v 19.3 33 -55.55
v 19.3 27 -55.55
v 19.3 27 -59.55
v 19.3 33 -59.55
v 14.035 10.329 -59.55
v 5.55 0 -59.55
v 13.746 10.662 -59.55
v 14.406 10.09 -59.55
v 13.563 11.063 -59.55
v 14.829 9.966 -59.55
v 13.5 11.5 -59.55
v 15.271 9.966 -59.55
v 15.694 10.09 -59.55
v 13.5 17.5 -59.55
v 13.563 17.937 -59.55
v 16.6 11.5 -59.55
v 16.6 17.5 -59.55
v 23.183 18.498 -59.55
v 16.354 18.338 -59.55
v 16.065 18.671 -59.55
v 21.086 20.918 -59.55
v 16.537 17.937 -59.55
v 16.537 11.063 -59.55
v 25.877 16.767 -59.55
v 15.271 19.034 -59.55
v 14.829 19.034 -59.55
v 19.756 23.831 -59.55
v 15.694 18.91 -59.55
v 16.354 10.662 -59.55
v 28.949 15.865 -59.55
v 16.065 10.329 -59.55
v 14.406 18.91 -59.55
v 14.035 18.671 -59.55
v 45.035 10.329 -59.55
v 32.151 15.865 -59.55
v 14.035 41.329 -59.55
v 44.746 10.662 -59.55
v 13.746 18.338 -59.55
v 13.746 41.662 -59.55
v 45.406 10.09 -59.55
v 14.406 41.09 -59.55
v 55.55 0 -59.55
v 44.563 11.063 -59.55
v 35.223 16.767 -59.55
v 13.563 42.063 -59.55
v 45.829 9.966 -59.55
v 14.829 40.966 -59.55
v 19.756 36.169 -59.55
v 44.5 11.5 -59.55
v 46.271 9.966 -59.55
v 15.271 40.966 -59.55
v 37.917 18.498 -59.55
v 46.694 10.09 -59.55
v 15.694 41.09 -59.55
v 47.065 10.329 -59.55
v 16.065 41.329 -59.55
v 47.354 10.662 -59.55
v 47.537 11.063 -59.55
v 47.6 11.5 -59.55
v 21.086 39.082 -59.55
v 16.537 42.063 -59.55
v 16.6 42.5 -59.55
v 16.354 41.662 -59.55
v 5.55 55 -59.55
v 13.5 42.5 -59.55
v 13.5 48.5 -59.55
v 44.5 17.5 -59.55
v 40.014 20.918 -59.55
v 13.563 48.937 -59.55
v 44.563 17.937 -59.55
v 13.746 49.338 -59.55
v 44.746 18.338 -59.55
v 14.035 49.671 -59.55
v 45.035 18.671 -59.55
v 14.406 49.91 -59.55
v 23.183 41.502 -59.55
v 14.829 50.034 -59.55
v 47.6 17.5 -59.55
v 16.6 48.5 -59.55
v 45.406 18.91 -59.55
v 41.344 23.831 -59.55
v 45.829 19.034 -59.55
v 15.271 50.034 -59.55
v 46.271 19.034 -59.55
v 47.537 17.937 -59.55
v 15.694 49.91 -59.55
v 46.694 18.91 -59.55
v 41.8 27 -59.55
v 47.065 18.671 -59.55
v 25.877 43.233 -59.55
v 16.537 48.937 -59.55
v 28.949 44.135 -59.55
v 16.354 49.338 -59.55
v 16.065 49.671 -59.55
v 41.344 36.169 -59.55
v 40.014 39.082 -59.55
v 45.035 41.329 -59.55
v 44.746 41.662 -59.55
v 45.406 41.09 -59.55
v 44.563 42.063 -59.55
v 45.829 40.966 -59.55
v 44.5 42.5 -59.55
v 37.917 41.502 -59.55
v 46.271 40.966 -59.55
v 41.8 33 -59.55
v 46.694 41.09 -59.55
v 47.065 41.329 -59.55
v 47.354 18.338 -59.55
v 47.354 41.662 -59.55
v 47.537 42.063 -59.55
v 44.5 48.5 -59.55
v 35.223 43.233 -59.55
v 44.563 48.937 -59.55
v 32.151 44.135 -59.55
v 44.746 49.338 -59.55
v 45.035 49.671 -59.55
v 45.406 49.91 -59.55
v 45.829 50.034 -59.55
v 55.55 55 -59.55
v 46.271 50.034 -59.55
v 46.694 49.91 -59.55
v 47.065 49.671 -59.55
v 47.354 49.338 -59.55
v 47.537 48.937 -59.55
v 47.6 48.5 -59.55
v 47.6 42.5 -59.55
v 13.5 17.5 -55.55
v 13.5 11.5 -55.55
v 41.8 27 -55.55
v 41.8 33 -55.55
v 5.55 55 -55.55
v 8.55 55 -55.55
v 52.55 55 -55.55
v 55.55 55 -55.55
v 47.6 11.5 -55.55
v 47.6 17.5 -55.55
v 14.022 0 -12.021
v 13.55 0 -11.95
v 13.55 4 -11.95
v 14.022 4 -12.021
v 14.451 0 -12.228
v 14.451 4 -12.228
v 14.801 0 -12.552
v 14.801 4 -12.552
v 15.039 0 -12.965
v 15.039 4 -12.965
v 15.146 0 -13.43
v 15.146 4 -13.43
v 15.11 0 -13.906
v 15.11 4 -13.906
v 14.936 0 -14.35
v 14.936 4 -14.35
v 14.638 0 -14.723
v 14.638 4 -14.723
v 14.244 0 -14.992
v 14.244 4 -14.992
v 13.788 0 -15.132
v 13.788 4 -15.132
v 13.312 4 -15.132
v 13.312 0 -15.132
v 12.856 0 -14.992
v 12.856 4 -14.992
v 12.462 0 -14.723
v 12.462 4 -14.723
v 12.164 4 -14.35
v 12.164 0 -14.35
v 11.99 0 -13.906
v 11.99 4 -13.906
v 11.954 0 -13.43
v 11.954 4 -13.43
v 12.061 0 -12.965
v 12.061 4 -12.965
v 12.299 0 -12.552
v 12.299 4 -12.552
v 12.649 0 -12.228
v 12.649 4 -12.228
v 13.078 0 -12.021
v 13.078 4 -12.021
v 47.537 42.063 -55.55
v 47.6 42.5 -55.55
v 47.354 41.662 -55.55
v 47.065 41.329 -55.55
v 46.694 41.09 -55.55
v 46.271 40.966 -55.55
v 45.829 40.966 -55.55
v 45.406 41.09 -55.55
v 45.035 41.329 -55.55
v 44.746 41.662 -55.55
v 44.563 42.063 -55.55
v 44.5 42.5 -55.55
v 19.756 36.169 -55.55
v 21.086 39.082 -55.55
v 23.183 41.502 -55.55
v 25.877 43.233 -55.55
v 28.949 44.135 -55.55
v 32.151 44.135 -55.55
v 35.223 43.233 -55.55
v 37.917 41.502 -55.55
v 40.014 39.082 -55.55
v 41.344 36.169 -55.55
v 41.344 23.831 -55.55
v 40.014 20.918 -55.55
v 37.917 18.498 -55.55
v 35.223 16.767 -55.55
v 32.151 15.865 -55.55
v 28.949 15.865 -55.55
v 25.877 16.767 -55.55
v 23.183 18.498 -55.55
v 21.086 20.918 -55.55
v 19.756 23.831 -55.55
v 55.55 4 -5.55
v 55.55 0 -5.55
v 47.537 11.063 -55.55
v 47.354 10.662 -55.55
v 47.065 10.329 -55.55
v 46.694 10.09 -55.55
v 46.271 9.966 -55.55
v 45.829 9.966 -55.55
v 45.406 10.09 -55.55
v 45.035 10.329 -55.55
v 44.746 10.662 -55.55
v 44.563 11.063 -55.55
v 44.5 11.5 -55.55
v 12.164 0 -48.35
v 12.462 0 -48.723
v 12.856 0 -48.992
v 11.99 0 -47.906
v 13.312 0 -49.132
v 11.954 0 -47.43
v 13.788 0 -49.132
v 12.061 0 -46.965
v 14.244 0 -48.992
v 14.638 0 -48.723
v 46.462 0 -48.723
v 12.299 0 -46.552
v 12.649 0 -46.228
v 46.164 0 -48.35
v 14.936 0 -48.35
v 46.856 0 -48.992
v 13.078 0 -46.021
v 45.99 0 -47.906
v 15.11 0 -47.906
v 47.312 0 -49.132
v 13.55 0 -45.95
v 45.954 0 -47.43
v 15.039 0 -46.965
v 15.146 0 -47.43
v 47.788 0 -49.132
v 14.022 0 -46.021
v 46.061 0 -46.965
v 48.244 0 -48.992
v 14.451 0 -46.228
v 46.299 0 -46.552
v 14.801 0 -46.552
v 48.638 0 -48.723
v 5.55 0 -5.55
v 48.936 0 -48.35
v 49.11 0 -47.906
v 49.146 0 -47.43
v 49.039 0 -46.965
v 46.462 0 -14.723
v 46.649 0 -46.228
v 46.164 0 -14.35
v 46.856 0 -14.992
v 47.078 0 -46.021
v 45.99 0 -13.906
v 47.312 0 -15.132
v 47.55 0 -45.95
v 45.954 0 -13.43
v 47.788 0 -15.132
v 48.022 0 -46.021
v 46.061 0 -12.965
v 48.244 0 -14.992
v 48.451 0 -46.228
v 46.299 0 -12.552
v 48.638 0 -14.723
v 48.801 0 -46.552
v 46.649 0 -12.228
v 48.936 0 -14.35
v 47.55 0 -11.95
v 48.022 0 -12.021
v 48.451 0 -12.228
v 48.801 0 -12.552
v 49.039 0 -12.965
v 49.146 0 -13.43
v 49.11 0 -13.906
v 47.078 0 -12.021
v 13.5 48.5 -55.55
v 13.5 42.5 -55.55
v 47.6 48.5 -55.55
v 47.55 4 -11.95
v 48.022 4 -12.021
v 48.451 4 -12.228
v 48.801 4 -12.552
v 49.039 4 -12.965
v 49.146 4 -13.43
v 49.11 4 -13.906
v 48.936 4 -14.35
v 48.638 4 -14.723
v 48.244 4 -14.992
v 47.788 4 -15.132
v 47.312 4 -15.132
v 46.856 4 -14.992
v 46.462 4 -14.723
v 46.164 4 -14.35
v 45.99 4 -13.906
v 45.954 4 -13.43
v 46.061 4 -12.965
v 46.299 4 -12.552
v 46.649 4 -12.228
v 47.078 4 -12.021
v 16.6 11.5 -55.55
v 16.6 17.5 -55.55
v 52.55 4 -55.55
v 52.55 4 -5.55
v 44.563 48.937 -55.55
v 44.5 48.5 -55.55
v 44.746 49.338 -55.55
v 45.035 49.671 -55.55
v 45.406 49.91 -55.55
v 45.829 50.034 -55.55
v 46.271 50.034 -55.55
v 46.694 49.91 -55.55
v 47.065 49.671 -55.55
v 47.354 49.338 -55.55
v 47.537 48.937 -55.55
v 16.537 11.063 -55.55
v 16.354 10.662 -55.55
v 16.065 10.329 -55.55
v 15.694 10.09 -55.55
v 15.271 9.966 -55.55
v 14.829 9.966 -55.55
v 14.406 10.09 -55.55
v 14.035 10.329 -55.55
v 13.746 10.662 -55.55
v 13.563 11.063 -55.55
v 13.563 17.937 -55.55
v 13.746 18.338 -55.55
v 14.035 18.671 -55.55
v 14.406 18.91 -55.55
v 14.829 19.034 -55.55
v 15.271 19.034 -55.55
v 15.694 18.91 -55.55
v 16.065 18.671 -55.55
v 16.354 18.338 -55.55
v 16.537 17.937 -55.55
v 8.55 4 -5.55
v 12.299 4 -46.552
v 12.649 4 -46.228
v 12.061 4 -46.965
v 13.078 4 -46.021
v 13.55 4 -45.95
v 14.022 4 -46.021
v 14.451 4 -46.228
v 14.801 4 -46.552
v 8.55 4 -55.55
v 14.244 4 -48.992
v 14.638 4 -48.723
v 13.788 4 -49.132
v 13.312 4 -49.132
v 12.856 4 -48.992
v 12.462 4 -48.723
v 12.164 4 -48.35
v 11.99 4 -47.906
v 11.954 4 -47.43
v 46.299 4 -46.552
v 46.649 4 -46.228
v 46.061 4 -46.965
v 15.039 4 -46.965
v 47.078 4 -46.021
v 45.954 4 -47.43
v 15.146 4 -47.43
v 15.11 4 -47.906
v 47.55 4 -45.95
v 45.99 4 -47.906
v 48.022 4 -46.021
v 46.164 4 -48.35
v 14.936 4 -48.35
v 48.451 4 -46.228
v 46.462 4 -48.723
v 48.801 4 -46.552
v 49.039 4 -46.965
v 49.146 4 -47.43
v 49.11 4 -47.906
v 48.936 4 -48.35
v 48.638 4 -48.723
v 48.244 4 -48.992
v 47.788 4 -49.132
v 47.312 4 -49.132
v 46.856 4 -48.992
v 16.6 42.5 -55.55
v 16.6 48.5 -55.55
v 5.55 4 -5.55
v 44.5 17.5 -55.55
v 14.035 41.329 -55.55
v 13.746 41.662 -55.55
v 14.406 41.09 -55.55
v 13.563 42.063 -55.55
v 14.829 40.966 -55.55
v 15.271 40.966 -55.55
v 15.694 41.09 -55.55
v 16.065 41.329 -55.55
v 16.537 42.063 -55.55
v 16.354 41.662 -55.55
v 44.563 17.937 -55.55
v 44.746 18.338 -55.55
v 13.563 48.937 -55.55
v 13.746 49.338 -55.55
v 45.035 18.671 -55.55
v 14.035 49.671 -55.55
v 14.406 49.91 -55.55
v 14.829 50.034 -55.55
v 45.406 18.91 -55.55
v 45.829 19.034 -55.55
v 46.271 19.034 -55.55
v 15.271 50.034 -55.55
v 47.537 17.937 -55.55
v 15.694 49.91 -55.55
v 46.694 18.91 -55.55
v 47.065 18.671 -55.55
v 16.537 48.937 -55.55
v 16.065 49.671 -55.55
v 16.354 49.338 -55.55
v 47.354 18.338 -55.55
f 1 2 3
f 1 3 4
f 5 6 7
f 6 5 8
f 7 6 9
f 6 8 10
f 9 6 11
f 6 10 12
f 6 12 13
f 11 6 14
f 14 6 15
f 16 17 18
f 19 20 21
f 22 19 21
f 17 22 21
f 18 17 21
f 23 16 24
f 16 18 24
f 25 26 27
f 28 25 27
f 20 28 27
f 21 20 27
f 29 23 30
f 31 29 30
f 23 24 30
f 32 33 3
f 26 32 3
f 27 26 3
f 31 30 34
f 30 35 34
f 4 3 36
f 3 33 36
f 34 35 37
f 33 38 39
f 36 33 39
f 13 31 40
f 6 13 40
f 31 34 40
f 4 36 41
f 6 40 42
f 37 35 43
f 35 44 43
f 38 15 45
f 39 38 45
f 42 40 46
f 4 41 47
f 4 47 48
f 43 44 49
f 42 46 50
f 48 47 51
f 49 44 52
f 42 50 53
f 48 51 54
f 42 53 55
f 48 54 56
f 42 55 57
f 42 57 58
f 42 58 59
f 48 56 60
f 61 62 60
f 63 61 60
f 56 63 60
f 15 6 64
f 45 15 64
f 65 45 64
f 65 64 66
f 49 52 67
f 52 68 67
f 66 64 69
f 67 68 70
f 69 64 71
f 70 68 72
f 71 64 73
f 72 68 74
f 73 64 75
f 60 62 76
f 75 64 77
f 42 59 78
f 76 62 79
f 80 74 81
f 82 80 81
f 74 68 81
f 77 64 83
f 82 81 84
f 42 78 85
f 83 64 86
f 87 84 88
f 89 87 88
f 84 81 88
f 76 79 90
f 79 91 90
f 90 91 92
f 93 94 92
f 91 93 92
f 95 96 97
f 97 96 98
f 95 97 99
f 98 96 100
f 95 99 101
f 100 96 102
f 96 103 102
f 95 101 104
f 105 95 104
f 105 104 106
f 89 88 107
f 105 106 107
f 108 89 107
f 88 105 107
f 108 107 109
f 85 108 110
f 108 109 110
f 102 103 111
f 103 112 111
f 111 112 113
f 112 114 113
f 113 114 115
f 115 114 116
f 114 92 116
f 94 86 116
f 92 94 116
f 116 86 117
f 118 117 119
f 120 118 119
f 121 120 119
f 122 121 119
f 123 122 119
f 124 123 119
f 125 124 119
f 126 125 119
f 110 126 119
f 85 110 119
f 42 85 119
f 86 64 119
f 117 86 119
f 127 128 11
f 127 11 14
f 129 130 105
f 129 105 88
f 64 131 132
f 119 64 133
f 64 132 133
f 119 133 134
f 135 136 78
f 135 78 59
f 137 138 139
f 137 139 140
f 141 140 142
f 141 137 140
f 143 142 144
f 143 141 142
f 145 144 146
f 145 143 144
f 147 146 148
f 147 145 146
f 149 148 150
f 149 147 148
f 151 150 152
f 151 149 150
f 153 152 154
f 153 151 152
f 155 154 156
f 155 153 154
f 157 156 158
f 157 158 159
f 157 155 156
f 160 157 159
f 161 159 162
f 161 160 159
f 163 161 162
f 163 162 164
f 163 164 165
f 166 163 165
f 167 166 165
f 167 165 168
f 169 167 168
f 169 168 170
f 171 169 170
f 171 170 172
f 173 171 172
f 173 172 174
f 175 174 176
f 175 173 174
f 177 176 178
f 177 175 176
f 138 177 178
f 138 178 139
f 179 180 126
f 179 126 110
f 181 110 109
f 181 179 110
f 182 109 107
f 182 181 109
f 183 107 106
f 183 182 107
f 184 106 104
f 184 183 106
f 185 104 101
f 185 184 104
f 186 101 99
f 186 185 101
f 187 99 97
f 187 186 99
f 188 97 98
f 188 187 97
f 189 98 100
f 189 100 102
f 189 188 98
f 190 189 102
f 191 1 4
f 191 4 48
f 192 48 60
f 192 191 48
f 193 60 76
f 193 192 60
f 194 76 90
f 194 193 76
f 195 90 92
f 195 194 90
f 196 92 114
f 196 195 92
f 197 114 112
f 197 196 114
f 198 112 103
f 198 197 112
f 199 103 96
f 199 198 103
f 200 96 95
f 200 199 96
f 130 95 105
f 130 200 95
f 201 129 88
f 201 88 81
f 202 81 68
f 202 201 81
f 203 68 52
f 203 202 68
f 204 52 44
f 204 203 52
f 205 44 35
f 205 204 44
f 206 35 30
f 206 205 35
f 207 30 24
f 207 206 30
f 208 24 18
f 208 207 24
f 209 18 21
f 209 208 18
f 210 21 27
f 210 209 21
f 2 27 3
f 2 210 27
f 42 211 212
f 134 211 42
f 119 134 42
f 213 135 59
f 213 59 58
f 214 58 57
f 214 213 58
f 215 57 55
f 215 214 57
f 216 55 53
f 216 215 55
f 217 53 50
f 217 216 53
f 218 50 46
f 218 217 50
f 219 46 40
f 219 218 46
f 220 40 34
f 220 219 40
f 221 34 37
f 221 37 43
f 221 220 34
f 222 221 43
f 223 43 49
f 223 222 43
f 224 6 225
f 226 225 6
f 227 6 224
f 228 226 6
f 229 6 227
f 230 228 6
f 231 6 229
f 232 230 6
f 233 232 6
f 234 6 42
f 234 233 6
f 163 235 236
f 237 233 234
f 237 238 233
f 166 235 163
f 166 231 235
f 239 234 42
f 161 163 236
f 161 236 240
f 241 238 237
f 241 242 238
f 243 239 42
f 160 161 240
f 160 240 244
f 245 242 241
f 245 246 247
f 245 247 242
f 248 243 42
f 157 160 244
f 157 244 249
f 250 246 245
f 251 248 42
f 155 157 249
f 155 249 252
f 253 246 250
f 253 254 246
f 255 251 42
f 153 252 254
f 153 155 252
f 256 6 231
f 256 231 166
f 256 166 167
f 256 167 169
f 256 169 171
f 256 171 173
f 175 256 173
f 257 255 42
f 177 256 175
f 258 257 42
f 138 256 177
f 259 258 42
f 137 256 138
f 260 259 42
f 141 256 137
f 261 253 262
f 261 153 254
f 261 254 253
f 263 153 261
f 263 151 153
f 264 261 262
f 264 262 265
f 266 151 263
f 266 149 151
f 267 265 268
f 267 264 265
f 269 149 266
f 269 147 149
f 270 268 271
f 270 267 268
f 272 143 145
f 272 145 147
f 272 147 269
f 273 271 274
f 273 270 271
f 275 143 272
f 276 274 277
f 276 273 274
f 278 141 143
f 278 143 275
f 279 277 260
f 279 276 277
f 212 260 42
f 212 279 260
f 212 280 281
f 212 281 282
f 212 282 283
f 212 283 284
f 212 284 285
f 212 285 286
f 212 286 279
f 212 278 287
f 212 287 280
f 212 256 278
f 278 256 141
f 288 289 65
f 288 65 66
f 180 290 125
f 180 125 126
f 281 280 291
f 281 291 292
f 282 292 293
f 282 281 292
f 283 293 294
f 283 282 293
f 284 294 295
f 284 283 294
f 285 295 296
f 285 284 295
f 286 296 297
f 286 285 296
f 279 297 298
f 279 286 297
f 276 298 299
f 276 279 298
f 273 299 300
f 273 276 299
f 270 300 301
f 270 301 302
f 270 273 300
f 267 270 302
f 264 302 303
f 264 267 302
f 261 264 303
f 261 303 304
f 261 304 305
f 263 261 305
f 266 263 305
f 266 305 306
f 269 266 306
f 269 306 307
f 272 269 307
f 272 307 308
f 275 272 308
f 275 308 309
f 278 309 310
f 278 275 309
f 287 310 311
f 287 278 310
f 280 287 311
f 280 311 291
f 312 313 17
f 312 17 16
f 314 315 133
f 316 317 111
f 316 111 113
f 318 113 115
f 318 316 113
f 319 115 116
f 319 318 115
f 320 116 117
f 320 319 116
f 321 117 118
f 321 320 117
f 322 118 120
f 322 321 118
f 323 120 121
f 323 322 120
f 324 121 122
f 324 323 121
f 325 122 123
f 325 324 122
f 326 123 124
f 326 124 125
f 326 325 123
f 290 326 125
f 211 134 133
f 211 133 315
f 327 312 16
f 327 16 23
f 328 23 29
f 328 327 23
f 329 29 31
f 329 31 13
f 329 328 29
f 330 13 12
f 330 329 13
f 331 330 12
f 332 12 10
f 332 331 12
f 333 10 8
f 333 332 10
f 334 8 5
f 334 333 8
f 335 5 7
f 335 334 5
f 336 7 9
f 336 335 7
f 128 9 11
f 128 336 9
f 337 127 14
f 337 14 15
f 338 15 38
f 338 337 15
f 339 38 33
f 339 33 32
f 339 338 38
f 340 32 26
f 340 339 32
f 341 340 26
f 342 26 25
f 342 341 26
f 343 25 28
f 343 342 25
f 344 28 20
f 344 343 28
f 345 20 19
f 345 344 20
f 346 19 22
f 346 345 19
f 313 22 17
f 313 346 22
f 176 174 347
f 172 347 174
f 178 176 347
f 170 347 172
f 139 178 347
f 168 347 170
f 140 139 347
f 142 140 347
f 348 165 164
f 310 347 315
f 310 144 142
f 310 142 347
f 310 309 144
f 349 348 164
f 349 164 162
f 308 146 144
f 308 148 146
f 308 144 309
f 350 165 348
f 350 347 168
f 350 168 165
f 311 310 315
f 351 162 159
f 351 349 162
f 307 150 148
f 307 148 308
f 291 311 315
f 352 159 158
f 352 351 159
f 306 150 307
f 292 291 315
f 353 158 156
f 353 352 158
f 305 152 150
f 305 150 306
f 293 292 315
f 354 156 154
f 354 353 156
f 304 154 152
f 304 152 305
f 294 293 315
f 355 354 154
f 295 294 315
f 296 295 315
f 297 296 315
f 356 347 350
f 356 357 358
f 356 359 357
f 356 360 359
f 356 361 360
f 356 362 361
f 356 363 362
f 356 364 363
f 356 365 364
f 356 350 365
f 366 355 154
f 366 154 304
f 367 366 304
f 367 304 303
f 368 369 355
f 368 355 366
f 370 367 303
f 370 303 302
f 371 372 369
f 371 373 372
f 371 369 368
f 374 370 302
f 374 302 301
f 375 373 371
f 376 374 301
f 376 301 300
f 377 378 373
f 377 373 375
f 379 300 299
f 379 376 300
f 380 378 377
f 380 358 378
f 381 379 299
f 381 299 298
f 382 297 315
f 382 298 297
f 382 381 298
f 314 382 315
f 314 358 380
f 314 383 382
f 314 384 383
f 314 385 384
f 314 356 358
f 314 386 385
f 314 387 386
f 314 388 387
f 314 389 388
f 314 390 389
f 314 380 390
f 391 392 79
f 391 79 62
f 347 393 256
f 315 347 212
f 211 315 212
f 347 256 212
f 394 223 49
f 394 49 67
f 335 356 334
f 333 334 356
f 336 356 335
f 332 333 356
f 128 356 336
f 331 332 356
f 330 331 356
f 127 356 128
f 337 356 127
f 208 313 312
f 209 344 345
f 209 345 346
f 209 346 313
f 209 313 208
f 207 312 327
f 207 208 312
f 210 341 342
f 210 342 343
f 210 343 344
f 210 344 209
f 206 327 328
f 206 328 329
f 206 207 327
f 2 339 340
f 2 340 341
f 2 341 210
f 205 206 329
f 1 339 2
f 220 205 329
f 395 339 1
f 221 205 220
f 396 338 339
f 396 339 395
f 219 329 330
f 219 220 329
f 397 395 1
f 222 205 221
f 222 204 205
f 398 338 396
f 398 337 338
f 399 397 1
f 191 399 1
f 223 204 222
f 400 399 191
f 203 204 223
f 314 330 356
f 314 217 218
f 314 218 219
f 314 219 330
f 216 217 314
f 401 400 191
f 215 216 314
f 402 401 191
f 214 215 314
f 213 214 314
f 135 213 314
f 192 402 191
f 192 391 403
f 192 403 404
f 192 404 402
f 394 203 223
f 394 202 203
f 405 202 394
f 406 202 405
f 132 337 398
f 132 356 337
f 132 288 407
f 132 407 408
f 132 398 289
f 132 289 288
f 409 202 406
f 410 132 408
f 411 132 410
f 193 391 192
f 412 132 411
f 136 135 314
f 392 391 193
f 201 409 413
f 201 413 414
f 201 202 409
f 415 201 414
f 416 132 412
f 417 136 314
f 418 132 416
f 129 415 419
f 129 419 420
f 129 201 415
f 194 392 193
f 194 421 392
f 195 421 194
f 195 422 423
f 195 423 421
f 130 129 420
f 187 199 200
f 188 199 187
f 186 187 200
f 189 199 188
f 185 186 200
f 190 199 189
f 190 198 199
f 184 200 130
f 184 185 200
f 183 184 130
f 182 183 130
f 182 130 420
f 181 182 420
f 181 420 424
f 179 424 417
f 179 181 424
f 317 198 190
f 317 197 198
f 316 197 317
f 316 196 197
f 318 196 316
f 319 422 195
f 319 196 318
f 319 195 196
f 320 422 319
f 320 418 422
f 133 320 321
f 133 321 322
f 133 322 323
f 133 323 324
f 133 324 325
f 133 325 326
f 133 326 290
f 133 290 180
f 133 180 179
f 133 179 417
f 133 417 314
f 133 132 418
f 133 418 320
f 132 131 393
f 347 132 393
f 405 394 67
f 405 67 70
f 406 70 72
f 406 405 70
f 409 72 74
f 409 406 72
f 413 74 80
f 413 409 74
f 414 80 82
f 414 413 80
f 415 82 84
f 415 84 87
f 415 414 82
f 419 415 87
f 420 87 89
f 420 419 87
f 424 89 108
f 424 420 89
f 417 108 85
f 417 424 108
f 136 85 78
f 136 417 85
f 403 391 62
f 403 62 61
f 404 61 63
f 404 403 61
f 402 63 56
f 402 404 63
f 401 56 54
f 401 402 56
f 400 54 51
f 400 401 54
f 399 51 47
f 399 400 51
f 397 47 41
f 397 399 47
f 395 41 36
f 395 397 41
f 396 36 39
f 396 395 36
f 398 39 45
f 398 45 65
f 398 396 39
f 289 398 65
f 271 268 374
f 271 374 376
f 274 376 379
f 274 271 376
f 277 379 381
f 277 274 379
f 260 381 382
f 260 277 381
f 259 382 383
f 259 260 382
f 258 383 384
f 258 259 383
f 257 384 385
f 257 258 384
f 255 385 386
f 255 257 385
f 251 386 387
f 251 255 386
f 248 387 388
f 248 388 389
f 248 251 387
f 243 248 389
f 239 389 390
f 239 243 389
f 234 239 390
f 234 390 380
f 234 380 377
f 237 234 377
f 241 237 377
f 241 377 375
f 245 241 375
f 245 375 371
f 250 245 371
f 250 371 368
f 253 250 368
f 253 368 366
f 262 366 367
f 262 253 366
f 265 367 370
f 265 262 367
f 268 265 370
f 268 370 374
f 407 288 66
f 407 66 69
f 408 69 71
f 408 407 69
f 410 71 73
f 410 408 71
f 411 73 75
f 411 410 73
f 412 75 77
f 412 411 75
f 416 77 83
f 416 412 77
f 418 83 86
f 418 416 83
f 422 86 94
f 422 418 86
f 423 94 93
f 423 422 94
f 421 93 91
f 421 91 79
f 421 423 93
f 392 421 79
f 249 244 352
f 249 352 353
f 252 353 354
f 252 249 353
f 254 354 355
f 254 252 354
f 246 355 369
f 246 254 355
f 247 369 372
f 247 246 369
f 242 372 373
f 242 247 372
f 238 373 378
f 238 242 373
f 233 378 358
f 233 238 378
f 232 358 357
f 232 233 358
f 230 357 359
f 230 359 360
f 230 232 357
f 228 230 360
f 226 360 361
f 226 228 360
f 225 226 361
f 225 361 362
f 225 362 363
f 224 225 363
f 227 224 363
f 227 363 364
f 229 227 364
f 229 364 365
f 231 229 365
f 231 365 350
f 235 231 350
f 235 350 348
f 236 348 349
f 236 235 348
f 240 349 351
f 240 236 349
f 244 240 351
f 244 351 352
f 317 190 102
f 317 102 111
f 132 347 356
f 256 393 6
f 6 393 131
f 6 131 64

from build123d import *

# Parameters (mm, degrees)
SKETCH3_W           = 50
SKETCH3_H           = 50
SKETCH3_R           = 1.6
BOSS_EXTRUDE1_DEPTH = 4
BOSS_EXTRUDE3_DEPTH = 4
BOSS_EXTRUDE4_DEPTH = 3
BOSS_EXTRUDE5_DEPTH = 3


with BuildPart() as part:
    # Sketch3 → Boss-Extrude1 (new body)
    with BuildSketch(Plane(origin=(0, 0, 0), x_dir=(1, 0, 0), z_dir=(0, 1, 0))):
        with Locations((30.55, 30.55)):
            Rectangle(SKETCH3_W, SKETCH3_H)
        with Locations(Location((13.55, 47.55, 0), (0, 0, 270))):
            Circle(SKETCH3_R, mode=Mode.SUBTRACT)
        with Locations(Location((47.55, 47.55, 0), (0, 0, 270))):
            Circle(SKETCH3_R, mode=Mode.SUBTRACT)
        with Locations(Location((13.55, 13.55, 0), (0, 0, 270))):
            Circle(SKETCH3_R, mode=Mode.SUBTRACT)
        with Locations(Location((47.55, 13.55, 0), (0, 0, 270))):
            Circle(SKETCH3_R, mode=Mode.SUBTRACT)
    extrude(amount=BOSS_EXTRUDE1_DEPTH)

    # Sketch5 → Boss-Extrude3 (add)
    with BuildSketch(Plane(origin=(0, 0, -55.55), x_dir=(-1, 0, 0), z_dir=(0, 0, -1))):
        Polygon((-55.55, 4), (-55.55, 48.5), (-55.55, 55), (-46.05, 55), (-5.55, 55), (-5.55, 48.5), (-5.55, 5), (-5.55, 0), (-55.55, 0), align=None)
        with BuildLine():
            Line((-41.8, 33), (-41.8, 27))
            ThreePointArc((-41.8, 27), (-30.55, 15.75), (-19.3, 27))
            Line((-19.3, 27), (-19.3, 33))
            ThreePointArc((-19.3, 33), (-30.55, 44.25), (-41.8, 33))
        make_face(mode=Mode.SUBTRACT)
        with BuildLine():
            Line((-47.6, 48.5), (-47.6, 42.5))
            ThreePointArc((-47.6, 42.5), (-46.05, 40.95), (-44.5, 42.5))
            Line((-44.5, 42.5), (-44.5, 48.5))
            ThreePointArc((-44.5, 48.5), (-46.05, 50.05), (-47.6, 48.5))
        make_face(mode=Mode.SUBTRACT)
        with BuildLine():
            Line((-16.6, 48.5), (-16.6, 42.5))
            ThreePointArc((-16.6, 42.5), (-15.05, 40.95), (-13.5, 42.5))
            Line((-13.5, 42.5), (-13.5, 48.5))
            ThreePointArc((-13.5, 48.5), (-15.05, 50.05), (-16.6, 48.5))
        make_face(mode=Mode.SUBTRACT)
        with BuildLine():
            Line((-16.6, 17.5), (-16.6, 11.5))
            ThreePointArc((-16.6, 11.5), (-15.05, 9.95), (-13.5, 11.5))
            Line((-13.5, 11.5), (-13.5, 17.5))
            ThreePointArc((-13.5, 17.5), (-15.05, 19.05), (-16.6, 17.5))
        make_face(mode=Mode.SUBTRACT)
        with BuildLine():
            Line((-47.6, 17.5), (-47.6, 11.5))
            ThreePointArc((-47.6, 11.5), (-46.05, 9.95), (-44.5, 11.5))
            Line((-44.5, 11.5), (-44.5, 17.5))
            ThreePointArc((-44.5, 17.5), (-46.05, 19.05), (-47.6, 17.5))
        make_face(mode=Mode.SUBTRACT)
    extrude(amount=BOSS_EXTRUDE3_DEPTH)

    # Sketch7 → Boss-Extrude4 (add)
    with BuildSketch(Plane(origin=(55.55, 0, 0), x_dir=(0, 0, -1), z_dir=(1, 0, 0))):
        Polygon((55.55, 55), (5.55, 4), (55.55, 4), align=None)
    extrude(amount=-BOSS_EXTRUDE4_DEPTH)

    # Sketch8 → Boss-Extrude5 (add)
    with BuildSketch(Plane.ZY.offset(-5.55)):
        Polygon((-55.55, 55), (-5.55, 4), (-55.55, 4), align=None)
    extrude(amount=-BOSS_EXTRUDE5_DEPTH)


solid = part.part
